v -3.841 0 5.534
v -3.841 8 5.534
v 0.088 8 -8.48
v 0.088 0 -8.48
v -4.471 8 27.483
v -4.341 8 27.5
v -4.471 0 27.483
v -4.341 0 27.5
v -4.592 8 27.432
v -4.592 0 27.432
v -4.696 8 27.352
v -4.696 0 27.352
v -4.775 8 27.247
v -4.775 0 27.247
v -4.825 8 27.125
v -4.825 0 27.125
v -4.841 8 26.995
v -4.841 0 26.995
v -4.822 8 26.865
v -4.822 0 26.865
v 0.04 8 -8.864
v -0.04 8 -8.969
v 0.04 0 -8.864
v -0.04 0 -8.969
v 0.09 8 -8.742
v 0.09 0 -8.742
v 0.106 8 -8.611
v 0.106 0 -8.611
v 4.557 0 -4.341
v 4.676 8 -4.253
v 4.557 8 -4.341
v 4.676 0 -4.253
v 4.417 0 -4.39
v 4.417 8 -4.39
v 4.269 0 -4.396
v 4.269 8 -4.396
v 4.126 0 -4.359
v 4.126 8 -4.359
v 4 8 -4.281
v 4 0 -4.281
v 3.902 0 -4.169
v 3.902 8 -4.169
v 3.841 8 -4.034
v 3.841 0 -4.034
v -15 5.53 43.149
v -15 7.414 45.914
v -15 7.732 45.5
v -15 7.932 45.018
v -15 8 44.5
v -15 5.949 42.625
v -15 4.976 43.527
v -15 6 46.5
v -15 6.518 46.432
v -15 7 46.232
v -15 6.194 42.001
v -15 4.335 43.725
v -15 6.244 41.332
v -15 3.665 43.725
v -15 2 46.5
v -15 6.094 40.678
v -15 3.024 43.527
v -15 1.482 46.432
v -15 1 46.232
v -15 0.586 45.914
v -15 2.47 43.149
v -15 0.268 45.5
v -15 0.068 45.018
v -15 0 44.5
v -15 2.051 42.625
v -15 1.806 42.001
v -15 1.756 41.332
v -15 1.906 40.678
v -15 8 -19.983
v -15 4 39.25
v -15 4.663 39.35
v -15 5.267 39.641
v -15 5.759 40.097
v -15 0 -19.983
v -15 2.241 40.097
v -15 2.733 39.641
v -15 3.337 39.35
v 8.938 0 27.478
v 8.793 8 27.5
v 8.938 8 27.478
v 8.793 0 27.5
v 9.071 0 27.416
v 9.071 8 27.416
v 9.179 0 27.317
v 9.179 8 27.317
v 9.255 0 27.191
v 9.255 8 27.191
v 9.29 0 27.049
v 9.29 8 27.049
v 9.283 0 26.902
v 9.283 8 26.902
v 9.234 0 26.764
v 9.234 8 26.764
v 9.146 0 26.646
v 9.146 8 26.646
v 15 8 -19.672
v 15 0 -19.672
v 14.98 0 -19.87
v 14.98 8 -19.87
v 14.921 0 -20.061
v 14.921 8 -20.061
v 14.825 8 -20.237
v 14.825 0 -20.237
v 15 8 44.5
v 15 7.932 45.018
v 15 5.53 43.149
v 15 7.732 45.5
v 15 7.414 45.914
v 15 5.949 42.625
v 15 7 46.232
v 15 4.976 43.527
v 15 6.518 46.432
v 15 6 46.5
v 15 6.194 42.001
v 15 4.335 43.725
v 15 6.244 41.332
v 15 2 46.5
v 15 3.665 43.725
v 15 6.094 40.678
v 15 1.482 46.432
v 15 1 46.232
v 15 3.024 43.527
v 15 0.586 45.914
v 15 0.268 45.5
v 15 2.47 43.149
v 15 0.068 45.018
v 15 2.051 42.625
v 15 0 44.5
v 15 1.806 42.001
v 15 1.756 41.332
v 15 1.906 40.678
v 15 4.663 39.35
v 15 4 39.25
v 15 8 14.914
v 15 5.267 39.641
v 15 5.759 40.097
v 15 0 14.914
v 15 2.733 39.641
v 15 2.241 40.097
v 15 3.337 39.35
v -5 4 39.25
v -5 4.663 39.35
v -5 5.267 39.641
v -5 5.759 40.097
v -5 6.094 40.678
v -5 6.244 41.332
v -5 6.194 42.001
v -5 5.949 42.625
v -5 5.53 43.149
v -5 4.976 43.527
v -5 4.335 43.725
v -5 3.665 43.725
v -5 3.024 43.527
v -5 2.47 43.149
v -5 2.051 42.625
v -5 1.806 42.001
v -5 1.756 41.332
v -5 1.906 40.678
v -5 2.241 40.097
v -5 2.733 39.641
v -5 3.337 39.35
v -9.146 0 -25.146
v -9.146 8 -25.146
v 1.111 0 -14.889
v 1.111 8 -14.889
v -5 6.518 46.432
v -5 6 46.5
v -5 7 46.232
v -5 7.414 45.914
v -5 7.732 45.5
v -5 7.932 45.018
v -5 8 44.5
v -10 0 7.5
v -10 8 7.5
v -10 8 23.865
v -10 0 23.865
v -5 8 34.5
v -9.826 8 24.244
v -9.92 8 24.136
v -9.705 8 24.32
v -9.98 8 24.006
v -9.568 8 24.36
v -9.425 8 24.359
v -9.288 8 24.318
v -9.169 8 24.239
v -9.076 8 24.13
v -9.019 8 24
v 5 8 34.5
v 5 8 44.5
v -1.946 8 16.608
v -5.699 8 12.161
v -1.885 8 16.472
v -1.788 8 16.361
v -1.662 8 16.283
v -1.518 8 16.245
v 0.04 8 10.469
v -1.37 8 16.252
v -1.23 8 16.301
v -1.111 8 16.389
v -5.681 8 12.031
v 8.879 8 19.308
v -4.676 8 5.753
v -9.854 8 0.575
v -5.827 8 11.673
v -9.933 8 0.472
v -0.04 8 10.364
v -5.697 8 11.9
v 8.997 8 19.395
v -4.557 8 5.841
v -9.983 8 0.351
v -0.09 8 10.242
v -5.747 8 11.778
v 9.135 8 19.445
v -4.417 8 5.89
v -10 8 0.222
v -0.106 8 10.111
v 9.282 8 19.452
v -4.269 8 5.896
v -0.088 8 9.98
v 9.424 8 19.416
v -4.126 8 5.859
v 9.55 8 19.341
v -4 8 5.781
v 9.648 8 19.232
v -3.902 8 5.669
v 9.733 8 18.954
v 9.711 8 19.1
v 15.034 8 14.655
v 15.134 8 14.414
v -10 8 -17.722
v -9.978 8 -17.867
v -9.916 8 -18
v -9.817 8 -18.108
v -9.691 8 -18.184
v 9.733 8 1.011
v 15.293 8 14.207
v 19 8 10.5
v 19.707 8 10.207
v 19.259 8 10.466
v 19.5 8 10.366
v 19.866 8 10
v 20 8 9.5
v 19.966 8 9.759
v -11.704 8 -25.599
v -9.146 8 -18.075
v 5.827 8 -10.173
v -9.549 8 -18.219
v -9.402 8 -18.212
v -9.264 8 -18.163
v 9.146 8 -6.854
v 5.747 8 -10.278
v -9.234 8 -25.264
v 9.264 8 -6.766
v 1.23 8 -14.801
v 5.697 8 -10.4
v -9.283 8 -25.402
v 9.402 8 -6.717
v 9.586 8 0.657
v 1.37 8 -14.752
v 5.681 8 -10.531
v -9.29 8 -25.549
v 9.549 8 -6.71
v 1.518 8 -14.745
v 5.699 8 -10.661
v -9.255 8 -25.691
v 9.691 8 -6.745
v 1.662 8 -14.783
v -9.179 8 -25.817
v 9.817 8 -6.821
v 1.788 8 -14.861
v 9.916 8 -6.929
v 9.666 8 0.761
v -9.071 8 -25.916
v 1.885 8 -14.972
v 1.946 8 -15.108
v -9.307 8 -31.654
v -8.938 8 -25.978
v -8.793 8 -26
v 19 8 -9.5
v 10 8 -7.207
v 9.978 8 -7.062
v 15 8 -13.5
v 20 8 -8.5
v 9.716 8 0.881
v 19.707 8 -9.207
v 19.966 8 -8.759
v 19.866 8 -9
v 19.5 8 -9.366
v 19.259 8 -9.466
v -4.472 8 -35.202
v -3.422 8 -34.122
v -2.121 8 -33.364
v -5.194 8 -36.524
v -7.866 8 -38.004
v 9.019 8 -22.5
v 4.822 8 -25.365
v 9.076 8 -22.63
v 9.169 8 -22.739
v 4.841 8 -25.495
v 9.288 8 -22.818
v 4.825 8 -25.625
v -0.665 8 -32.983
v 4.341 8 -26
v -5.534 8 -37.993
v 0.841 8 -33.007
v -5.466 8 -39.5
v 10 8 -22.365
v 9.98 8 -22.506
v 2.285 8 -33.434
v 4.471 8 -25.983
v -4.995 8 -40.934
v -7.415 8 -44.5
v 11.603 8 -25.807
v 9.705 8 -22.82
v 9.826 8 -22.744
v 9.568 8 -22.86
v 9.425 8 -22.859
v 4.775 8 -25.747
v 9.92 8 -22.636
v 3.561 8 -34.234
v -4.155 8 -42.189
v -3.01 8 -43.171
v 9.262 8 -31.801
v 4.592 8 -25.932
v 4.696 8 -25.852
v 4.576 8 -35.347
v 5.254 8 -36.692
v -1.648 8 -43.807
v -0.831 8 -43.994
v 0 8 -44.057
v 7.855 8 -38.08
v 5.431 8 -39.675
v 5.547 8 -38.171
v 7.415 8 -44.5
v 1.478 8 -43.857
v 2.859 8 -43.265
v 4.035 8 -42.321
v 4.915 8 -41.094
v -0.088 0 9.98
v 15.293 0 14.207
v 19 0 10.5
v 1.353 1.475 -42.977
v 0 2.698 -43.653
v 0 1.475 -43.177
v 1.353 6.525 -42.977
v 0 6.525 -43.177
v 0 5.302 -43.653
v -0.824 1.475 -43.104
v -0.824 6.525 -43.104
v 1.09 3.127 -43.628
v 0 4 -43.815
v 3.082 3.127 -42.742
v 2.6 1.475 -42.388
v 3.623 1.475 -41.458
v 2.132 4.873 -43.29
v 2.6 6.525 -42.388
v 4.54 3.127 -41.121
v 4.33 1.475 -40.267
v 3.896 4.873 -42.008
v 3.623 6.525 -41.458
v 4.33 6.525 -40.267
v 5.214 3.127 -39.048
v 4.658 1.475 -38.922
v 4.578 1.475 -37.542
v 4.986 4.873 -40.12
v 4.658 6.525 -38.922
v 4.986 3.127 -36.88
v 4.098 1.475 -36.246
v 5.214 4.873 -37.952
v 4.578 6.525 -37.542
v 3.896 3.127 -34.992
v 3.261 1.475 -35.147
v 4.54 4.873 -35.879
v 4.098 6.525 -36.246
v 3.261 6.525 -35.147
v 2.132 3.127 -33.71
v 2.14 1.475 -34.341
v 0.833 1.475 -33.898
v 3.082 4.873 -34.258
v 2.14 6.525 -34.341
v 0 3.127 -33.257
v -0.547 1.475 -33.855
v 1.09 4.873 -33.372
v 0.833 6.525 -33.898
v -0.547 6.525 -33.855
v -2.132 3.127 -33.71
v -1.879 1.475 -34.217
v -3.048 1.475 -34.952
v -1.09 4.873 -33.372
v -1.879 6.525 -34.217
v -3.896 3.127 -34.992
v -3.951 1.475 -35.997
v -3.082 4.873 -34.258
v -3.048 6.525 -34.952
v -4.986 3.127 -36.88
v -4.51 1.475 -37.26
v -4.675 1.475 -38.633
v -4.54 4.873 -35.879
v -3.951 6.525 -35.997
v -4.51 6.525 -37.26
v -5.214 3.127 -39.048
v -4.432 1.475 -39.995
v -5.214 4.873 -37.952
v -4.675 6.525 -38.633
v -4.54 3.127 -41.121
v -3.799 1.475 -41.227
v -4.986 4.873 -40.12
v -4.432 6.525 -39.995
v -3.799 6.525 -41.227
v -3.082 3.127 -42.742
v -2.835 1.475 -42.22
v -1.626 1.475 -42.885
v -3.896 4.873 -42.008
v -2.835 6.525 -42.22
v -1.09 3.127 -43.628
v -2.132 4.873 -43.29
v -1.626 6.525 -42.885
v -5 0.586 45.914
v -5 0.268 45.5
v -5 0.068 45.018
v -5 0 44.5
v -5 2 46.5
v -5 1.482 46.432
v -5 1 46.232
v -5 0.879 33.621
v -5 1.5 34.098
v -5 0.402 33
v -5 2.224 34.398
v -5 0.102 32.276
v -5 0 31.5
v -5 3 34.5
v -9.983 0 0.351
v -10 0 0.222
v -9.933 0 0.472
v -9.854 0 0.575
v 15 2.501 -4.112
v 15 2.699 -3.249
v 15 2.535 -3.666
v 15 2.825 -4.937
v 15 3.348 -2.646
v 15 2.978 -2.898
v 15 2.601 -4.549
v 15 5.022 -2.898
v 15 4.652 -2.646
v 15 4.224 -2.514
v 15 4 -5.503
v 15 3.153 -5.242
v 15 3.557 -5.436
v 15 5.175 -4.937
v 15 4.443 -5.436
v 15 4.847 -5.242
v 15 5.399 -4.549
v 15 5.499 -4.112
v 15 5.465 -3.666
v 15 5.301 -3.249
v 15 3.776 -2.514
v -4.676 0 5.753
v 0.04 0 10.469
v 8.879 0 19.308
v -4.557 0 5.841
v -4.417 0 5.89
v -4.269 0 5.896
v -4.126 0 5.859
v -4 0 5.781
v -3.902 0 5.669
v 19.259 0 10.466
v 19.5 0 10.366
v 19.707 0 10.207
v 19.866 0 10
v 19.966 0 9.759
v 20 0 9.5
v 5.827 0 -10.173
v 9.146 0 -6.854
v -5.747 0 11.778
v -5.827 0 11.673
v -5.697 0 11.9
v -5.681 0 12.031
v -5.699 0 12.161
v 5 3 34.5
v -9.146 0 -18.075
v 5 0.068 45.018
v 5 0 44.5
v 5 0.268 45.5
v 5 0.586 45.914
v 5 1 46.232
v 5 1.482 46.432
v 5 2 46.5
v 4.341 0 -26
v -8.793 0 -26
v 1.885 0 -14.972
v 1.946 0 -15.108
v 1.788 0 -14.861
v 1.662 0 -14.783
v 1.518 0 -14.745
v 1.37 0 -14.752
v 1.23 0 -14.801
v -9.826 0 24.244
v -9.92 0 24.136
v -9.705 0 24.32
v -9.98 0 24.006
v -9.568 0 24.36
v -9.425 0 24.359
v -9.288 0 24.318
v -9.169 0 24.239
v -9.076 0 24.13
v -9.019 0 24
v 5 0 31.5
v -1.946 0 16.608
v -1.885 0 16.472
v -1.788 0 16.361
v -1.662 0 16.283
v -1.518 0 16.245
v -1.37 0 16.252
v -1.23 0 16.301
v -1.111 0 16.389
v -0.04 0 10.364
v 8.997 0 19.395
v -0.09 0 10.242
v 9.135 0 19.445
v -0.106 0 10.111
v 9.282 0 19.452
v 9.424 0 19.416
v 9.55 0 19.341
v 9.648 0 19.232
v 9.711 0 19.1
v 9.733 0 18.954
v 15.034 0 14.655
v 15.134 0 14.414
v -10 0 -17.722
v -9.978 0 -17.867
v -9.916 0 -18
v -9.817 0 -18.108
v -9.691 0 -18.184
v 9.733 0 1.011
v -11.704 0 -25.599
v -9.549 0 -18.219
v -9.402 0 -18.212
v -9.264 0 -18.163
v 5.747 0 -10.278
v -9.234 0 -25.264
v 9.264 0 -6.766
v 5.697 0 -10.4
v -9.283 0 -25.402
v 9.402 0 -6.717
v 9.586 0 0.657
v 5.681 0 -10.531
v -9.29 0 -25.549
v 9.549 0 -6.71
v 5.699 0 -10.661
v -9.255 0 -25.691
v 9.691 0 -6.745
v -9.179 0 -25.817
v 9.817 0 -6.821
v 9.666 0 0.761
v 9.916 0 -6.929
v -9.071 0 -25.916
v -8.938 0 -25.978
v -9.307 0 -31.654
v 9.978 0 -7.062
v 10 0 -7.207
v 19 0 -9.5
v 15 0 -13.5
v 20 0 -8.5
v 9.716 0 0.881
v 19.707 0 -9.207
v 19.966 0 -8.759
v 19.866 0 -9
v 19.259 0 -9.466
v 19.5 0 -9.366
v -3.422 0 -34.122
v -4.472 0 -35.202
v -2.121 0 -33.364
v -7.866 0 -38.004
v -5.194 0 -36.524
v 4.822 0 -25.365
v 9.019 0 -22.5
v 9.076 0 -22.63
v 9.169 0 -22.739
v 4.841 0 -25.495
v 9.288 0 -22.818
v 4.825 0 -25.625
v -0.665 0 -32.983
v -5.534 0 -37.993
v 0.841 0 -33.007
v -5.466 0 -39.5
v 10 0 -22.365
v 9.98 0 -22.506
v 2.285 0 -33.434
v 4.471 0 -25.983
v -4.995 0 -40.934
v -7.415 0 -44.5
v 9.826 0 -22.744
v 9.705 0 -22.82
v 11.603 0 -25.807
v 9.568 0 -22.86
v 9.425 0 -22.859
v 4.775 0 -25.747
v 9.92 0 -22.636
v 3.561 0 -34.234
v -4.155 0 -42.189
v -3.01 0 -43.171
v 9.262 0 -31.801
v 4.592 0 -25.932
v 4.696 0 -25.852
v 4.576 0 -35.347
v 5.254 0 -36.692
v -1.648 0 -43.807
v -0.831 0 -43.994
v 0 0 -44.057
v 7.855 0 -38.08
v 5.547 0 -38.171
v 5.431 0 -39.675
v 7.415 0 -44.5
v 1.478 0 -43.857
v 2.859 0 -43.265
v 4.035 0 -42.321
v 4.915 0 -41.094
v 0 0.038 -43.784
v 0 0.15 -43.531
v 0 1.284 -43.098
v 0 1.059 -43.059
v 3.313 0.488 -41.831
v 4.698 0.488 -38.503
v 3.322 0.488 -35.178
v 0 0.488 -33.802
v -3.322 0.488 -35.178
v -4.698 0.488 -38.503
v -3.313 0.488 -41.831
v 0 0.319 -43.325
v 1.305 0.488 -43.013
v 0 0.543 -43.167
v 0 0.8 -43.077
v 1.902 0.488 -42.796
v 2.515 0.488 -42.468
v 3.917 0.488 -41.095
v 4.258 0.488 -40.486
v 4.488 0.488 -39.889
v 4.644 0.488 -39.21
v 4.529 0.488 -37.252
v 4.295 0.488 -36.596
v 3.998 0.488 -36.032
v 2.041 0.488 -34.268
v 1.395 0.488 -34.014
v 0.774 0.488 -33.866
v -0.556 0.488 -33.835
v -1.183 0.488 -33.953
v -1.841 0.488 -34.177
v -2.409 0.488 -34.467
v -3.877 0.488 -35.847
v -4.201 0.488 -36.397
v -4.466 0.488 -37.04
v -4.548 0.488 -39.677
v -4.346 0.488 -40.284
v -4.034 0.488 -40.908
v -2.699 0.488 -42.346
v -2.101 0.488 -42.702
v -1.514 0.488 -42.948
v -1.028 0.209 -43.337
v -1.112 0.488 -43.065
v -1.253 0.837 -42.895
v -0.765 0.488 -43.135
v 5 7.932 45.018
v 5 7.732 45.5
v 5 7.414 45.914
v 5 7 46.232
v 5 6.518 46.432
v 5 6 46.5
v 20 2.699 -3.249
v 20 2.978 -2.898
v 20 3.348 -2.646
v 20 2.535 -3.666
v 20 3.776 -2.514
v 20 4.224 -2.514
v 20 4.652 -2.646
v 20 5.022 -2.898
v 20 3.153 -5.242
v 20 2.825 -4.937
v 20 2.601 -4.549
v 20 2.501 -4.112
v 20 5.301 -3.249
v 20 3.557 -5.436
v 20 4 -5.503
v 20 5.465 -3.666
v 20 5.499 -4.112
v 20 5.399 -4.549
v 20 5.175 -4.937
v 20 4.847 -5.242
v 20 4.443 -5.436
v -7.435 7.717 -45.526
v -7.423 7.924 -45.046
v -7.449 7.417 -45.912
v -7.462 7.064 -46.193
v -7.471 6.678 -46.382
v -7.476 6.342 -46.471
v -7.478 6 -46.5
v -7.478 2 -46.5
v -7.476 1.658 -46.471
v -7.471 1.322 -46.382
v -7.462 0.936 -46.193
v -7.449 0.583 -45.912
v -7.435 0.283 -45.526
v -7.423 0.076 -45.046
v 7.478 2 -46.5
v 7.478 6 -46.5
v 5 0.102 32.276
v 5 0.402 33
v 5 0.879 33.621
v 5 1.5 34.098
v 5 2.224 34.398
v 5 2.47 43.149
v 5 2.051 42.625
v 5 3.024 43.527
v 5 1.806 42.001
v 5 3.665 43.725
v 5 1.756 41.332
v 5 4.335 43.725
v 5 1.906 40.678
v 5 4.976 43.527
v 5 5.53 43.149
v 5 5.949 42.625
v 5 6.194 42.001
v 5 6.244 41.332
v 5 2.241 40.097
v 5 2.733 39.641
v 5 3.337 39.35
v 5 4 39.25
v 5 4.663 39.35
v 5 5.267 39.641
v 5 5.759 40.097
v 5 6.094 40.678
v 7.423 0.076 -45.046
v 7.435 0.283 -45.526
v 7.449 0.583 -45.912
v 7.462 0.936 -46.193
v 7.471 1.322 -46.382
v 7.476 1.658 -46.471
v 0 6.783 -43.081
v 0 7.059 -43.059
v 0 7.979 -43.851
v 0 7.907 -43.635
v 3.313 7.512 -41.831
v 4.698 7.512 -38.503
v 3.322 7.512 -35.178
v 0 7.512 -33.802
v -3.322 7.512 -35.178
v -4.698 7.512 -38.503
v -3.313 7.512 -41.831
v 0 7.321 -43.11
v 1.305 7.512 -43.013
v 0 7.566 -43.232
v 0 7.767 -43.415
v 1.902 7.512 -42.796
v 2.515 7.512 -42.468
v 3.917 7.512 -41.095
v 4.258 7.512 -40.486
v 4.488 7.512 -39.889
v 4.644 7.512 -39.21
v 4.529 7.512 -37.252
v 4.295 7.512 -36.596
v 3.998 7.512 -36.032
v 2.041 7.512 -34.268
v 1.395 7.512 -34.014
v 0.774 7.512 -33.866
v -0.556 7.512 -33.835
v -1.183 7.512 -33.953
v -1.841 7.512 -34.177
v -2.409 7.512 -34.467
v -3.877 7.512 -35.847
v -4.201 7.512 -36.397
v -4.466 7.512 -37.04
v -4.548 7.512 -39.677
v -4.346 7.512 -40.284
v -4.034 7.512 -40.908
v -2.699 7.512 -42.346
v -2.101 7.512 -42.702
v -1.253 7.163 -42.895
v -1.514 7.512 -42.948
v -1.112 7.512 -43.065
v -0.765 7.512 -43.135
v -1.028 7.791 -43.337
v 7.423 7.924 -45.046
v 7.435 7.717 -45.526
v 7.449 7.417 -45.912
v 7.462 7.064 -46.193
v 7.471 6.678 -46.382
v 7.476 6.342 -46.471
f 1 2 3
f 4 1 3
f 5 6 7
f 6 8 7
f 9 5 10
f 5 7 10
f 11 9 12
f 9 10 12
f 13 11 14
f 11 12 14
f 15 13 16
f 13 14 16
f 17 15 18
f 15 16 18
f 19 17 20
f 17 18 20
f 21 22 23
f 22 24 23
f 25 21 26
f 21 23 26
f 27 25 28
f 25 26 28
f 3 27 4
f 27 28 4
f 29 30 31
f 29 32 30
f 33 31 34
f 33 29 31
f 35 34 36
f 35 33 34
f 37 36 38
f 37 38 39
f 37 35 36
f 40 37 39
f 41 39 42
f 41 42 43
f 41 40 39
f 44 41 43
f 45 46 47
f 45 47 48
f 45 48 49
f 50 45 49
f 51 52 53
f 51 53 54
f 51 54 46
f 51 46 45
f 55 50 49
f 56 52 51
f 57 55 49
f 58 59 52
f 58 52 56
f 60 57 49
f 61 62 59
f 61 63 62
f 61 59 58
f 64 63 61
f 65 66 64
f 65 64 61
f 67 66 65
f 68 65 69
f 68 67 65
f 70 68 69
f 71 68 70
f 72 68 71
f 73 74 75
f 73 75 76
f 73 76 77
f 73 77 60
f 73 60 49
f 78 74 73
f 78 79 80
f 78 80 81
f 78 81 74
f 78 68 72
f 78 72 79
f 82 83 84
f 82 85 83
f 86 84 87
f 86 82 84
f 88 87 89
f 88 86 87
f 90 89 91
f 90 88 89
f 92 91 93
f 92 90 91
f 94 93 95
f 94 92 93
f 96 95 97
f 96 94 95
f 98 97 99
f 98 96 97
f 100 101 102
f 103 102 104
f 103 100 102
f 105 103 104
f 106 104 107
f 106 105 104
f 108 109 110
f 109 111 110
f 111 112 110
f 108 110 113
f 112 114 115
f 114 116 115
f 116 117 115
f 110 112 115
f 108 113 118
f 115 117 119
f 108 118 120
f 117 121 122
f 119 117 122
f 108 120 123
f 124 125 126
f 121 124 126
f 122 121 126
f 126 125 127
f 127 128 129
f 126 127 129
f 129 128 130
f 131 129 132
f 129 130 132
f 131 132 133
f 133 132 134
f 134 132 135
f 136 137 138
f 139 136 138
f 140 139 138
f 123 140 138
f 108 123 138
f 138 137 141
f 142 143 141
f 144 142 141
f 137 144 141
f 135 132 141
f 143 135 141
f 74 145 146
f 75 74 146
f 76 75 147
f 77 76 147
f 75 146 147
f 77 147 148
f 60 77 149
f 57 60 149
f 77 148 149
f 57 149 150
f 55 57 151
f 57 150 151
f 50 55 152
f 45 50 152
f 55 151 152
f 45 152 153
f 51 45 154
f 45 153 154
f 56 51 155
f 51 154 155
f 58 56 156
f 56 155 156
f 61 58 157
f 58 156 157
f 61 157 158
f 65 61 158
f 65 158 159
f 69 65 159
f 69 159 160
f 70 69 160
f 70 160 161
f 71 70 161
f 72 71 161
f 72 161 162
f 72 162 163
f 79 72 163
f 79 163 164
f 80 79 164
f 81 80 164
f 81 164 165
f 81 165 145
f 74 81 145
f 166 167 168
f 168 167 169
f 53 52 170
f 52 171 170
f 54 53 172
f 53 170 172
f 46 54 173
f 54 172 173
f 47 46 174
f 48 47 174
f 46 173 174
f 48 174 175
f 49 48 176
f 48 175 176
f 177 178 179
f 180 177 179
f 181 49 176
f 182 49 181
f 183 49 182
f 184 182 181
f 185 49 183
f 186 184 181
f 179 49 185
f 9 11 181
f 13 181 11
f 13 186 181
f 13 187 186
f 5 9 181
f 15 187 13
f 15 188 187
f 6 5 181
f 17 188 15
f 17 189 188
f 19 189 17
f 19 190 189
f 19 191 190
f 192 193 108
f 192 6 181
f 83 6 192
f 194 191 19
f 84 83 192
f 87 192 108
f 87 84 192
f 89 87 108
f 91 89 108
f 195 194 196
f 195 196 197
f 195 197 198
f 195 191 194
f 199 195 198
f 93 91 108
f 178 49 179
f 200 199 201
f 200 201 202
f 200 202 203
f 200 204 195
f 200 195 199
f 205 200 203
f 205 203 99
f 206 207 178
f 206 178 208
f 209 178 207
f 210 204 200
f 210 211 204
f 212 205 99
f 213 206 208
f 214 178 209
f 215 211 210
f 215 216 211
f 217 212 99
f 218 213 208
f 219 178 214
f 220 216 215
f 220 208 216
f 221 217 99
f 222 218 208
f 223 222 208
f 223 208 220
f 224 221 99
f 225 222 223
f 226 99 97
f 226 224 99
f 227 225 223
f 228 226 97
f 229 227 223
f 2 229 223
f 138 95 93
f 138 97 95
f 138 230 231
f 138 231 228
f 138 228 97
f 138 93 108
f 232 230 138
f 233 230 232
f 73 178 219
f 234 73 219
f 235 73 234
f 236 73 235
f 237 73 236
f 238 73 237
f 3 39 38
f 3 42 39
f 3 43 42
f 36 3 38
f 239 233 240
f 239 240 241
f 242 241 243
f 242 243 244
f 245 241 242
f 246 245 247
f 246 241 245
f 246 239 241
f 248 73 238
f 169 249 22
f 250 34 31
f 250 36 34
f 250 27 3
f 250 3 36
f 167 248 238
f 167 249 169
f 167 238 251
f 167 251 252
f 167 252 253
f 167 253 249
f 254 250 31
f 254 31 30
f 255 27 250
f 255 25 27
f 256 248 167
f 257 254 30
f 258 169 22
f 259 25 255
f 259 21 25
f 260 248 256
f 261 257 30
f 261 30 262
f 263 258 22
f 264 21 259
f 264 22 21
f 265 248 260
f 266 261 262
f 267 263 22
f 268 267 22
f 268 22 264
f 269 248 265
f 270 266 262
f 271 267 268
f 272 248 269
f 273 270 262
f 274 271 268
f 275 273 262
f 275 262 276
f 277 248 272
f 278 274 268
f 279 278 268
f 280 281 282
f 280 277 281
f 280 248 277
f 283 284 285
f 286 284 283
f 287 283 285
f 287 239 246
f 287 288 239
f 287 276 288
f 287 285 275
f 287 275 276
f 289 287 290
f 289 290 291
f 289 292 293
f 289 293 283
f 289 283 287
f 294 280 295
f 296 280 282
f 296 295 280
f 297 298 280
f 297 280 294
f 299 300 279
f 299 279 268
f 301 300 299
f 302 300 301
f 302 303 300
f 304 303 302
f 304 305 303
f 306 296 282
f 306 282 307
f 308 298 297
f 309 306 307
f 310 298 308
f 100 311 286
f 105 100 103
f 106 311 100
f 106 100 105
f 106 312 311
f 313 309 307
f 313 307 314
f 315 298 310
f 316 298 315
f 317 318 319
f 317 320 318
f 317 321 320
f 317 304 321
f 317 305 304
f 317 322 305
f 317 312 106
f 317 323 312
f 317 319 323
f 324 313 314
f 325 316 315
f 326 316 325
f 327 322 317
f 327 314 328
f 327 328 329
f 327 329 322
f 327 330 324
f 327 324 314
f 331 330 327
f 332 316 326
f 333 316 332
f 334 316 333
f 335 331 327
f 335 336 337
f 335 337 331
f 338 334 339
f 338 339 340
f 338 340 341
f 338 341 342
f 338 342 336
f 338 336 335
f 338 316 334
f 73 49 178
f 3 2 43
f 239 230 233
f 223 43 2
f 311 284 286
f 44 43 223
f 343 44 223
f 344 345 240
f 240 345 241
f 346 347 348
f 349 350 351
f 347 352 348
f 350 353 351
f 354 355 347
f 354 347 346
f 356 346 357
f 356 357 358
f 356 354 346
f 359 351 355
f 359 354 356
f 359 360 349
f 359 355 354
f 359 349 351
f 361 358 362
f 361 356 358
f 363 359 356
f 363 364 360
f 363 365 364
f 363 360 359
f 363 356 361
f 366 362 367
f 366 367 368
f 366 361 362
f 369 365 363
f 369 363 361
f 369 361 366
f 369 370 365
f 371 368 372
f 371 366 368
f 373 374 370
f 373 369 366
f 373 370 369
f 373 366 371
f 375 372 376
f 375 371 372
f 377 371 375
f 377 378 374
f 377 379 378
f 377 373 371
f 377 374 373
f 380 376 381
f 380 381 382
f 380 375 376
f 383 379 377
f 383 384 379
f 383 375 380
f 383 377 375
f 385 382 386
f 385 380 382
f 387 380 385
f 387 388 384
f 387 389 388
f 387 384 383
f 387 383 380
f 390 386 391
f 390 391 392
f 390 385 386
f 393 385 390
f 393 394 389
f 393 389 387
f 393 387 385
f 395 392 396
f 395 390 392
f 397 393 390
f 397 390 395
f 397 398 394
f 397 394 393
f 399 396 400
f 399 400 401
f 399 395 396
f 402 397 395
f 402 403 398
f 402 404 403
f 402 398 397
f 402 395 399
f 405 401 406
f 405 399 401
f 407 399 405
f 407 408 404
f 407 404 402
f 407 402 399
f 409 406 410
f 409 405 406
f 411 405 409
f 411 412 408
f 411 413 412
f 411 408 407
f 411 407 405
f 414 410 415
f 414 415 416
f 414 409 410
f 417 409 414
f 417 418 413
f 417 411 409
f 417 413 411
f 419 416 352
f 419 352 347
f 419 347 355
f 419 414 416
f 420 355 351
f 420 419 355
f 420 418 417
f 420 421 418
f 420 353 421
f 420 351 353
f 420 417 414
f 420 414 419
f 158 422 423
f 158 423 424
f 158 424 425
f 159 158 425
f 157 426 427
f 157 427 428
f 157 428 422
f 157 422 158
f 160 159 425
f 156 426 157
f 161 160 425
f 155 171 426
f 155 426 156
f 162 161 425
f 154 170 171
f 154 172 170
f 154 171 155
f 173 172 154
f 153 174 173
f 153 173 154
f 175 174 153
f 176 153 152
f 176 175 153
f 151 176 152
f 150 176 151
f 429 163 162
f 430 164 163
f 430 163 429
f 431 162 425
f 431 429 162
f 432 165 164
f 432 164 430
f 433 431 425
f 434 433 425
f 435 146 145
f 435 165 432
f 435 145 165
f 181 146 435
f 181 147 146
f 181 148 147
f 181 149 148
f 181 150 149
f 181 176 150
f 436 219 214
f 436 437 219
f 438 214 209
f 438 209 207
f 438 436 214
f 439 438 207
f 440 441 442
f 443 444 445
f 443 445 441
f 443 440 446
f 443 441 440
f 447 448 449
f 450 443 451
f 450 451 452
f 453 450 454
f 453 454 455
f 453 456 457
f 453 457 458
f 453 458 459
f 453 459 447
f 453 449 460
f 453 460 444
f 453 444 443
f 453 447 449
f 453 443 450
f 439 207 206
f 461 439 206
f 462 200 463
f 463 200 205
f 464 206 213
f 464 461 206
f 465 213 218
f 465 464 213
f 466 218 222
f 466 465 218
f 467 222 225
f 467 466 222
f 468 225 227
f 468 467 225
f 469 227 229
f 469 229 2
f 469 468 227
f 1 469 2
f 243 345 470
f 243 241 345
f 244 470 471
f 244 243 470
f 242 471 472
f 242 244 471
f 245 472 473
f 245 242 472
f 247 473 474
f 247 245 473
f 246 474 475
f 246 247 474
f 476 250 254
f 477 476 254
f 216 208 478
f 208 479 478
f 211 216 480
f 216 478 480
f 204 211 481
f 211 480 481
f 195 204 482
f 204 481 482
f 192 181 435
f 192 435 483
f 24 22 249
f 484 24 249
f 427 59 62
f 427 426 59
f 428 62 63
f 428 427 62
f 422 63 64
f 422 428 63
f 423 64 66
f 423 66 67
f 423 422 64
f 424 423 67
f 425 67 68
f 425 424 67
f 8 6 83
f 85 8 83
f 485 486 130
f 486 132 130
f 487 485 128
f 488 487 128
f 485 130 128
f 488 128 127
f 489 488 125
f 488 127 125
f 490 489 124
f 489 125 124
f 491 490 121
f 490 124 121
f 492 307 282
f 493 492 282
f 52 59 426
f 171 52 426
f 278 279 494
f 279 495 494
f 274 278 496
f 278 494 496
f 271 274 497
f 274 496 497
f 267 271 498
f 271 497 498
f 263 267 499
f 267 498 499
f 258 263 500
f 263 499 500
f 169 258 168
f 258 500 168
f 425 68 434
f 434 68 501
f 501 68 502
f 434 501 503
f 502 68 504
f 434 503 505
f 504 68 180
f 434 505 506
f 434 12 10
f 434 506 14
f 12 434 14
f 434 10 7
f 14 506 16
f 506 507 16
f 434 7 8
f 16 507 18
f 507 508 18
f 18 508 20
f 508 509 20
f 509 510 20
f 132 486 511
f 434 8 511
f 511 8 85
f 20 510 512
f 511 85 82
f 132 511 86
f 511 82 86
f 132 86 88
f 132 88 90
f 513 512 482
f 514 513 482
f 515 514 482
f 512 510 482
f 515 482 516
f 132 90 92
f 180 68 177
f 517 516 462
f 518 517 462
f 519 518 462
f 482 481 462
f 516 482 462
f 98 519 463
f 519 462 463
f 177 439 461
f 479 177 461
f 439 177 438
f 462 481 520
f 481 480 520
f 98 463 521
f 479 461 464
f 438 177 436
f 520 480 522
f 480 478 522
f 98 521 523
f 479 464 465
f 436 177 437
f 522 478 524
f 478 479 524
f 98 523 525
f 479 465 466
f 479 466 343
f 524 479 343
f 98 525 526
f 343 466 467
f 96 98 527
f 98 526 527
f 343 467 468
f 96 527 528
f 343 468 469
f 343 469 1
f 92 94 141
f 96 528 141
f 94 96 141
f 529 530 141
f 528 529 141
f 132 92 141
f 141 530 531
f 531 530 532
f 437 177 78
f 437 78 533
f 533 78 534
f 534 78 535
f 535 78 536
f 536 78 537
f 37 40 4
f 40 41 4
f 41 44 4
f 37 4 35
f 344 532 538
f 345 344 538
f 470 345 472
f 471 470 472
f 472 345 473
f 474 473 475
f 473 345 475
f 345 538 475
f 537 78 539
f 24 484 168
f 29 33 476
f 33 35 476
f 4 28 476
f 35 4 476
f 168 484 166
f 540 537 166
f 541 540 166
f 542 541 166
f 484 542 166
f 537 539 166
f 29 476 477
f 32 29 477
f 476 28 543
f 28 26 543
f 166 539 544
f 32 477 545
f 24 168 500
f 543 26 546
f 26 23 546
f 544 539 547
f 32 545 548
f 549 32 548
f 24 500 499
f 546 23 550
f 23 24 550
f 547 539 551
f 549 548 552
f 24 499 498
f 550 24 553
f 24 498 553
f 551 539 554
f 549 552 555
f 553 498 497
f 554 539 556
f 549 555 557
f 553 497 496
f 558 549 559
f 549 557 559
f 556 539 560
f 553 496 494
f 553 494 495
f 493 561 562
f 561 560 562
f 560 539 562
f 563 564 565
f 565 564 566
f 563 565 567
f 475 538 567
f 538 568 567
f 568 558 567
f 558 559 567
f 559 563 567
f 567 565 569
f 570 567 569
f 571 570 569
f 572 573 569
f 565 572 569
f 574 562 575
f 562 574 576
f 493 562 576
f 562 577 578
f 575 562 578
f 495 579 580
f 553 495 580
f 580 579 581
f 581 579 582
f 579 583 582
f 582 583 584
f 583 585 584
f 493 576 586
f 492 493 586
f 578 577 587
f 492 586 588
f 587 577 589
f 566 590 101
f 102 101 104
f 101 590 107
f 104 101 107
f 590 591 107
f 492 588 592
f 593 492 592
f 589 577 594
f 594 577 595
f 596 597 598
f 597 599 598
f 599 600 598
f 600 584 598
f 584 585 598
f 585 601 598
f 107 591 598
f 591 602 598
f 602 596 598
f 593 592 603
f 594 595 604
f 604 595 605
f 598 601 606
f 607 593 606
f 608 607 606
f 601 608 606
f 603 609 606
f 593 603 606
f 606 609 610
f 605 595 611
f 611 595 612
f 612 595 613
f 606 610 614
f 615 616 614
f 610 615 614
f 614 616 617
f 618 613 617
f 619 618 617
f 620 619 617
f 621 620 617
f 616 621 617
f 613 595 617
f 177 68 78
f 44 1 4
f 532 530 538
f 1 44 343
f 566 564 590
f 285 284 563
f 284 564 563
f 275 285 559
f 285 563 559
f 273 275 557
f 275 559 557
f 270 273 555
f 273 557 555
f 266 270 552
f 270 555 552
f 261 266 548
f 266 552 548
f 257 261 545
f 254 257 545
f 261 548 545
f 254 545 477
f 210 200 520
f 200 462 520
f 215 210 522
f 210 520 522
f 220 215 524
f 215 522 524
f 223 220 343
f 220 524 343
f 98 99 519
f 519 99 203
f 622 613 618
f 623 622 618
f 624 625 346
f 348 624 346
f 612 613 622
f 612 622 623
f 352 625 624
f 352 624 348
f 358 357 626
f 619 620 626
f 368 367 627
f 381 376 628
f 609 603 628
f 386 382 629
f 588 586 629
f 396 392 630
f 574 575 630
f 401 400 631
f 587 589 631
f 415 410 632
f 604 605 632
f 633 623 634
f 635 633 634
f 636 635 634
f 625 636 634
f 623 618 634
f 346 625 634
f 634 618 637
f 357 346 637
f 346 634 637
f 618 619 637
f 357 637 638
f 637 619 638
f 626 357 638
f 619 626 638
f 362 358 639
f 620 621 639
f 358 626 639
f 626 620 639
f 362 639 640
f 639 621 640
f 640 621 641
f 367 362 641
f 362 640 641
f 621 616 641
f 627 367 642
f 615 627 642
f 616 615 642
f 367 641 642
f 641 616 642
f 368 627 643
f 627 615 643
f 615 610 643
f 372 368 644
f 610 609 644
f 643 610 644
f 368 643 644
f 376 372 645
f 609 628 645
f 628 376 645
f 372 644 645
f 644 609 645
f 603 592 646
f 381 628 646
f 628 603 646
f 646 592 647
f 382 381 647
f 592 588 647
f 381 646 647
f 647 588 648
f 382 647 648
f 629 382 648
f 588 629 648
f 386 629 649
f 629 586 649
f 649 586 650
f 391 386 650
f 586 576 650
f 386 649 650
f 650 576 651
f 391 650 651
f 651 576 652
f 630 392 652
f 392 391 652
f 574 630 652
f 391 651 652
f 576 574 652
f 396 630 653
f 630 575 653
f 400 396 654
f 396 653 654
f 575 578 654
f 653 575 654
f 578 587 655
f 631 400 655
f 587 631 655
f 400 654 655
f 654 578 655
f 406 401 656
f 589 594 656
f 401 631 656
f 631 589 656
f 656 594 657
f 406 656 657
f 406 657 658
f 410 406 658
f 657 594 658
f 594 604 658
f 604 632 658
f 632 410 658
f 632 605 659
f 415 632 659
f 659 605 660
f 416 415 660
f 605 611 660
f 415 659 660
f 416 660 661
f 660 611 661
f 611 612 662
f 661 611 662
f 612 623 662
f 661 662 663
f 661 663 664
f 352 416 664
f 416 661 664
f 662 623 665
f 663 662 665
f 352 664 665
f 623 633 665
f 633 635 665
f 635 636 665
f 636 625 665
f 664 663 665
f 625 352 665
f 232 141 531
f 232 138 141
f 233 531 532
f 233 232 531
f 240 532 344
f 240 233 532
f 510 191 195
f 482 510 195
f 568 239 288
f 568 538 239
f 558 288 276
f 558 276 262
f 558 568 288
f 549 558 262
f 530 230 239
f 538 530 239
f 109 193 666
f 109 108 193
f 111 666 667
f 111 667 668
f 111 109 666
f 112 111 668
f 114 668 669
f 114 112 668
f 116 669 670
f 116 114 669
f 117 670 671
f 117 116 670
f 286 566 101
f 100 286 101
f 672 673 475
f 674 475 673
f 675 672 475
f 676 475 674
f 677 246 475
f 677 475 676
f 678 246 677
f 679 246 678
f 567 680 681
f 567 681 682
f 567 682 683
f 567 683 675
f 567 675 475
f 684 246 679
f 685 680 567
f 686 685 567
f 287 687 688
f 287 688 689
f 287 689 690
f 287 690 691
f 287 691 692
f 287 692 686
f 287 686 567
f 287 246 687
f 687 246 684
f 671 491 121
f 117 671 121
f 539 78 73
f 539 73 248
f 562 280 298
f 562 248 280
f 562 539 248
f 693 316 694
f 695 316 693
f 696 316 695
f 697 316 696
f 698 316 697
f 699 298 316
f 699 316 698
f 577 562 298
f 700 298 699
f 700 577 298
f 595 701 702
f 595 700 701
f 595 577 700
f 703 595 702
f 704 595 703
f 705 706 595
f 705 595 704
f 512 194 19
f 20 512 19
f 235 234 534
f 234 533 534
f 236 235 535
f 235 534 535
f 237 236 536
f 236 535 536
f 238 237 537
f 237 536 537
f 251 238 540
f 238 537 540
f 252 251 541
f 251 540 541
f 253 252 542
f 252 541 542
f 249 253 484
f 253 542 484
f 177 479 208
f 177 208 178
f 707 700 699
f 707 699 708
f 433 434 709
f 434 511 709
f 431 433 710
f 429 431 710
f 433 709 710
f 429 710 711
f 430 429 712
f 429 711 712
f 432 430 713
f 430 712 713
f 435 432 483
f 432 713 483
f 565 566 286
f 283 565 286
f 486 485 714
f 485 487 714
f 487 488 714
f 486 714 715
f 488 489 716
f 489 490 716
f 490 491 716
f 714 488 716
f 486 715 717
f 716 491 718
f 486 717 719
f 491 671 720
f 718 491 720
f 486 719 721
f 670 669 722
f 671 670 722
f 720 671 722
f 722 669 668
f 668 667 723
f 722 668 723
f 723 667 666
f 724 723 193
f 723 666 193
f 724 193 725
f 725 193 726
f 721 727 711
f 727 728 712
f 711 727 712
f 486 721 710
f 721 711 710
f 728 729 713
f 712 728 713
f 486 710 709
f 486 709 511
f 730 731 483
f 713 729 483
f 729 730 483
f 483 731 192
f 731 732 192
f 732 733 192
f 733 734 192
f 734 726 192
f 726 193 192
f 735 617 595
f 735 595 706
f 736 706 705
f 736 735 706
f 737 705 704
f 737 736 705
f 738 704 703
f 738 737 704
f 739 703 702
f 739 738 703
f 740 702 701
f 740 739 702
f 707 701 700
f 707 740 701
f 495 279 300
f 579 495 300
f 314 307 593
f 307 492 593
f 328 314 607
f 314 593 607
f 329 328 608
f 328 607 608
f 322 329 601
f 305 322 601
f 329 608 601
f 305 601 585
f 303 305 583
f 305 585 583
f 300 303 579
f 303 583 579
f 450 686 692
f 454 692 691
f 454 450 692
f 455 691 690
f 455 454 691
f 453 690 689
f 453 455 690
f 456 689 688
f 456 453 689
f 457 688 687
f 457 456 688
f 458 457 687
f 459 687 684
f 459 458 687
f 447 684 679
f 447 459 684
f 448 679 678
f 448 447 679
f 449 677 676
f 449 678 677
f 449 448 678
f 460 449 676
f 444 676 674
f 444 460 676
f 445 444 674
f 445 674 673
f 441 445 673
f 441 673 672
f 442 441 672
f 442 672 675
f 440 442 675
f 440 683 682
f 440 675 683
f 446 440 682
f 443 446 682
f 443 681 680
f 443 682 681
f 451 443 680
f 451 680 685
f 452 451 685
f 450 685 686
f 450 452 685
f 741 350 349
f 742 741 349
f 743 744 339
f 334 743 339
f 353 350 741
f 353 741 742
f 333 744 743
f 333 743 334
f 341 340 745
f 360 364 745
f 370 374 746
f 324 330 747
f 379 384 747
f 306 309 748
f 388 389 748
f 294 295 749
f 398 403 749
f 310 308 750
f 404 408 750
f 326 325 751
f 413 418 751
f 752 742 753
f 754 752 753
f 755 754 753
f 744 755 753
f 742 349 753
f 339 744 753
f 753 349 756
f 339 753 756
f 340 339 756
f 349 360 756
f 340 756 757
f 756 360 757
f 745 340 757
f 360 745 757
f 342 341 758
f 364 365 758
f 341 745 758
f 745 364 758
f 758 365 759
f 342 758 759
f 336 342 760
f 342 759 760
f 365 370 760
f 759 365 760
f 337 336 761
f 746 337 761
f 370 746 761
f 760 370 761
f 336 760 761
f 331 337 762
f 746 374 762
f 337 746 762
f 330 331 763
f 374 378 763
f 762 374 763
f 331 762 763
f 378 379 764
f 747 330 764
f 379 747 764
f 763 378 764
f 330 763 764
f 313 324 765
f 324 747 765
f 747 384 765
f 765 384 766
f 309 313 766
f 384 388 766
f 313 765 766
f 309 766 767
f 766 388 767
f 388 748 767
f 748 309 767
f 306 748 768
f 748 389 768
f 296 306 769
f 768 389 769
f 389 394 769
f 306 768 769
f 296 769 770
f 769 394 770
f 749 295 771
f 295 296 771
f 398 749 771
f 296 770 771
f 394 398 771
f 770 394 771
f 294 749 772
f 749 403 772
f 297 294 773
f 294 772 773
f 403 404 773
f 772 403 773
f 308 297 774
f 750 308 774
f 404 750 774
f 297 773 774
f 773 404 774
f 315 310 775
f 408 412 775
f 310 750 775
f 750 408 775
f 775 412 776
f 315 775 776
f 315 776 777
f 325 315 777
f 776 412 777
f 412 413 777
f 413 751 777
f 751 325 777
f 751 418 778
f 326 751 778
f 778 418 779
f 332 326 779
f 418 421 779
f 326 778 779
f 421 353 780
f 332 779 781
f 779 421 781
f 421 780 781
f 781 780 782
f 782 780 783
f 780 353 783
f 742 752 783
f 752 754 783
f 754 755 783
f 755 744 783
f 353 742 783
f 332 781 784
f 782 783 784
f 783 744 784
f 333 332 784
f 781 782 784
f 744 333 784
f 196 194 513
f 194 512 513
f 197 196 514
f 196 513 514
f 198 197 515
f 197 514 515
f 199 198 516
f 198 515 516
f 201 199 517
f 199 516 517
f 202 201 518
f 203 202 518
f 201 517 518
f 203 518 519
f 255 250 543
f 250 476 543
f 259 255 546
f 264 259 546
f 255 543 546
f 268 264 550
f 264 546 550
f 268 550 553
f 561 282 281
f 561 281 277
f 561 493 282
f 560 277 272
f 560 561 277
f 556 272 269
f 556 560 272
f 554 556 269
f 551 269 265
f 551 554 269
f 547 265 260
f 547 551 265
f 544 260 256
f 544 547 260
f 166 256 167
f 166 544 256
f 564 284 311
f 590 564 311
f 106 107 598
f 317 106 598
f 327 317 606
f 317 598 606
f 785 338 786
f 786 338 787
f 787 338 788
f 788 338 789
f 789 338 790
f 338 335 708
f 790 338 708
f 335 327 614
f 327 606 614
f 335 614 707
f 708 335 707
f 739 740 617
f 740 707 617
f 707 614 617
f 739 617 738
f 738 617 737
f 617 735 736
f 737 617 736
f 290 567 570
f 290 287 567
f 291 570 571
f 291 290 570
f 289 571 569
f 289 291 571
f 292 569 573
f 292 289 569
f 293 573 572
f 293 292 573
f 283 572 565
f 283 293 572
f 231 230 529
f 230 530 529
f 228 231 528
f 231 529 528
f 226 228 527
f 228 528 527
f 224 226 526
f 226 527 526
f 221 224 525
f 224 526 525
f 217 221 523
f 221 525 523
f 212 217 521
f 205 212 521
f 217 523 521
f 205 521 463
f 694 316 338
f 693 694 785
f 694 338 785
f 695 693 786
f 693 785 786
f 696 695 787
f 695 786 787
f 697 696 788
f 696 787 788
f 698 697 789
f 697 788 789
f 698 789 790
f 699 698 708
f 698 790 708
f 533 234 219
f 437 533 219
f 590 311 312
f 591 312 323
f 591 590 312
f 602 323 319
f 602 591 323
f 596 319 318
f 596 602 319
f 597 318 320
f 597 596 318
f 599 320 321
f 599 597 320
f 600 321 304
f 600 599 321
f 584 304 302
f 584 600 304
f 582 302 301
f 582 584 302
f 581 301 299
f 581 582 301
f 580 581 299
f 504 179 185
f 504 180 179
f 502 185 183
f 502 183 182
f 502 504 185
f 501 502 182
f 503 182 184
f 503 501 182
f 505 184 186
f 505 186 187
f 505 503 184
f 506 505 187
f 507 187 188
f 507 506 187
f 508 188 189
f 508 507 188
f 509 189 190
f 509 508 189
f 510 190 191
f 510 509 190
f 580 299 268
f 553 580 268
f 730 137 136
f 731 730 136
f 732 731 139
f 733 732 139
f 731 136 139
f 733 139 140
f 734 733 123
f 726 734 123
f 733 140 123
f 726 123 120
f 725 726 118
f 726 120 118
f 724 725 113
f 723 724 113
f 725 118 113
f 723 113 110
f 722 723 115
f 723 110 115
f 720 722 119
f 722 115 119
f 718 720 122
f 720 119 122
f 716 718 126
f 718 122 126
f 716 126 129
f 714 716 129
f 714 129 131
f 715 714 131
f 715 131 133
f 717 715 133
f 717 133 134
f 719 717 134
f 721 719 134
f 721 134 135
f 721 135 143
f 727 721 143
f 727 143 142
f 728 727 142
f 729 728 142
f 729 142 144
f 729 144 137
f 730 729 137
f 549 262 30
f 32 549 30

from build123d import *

# Parameters (mm, degrees)
SKETCH1_W               = 30
SKETCH1_H               = 93
BOSS_EXTRUDE1_DEPTH     = 8
SKETCH2_W               = 10
SKETCH2_H               = 12
CUT_EXTRUDE1_DEPTH      = 8
SKETCH3_R               = 2.25
CUT_EXTRUDE2_DEPTH      = 56.91287866
FILLET1_R               = 2
CUT_EXTRUDE3_DEPTH      = 50.51009998
FILLET2_R               = 3
CUT_EXTRUDE4_DEPTH      = 50.51009998
CUT_EXTRUDE4_DEPTH_BACK = 50.51009998
FILLET3_R               = 1
FILLET4_R               = 0.5
SKETCH8_W               = 20
SKETCH8_H               = 8
BOSS_EXTRUDE2_DEPTH     = 5
CUT_EXTRUDE5_DEPTH      = 59.747340518
CUT_EXTRUDE5_DEPTH_BACK = 5
SKETCH9_R               = 1.502727392
CHAMFER1_SIZE           = 4
FILLET5_R               = 1


with BuildPart() as part:
    # Sketch1 → Boss-Extrude1 (new body)
    with BuildSketch(Plane(origin=(0, 0, 0), x_dir=(1, 0, 0), z_dir=(0, 1, 0))):
        Rectangle(SKETCH1_W, SKETCH1_H)
    extrude(amount=BOSS_EXTRUDE1_DEPTH)

    # Sketch2 → Cut-Extrude1 (cut)
    with BuildSketch(Plane(origin=(0, 8, 0), x_dir=(1, 0, 0), z_dir=(0, 1, 0))):
        with Locations((0, -40.5)):
            Rectangle(SKETCH2_W, SKETCH2_H)
    extrude(amount=-CUT_EXTRUDE1_DEPTH, mode=Mode.SUBTRACT)

    # Sketch3 → Cut-Extrude2 (cut, through all)
    with BuildSketch(Plane(origin=(15, 0, 0), x_dir=(0, 0, -1), z_dir=(1, 0, 0))):
        with Locations((-41.5, 4)):
            Circle(SKETCH3_R)
    extrude(amount=-CUT_EXTRUDE2_DEPTH, mode=Mode.SUBTRACT)

    # Fillet1
    fillet1_edges = [part.edges().sort_by_distance(p)[0] for p in [
        (10, 0, 46.5),
        (-10, 8, 46.5),
        (10, 8, 46.5),
        (-10, 0, 46.5),
        (0, 0, -46.5),
        (0, 8, -46.5),
    ]]
    fillet(fillet1_edges, radius=FILLET1_R)

    # Sketch4 → Cut-Extrude3 (cut, through all)
    with BuildSketch(Plane(origin=(0, 8, 0), x_dir=(1, 0, 0), z_dir=(0, 1, 0))):
        Polygon((5, 26), (-10, 26), (1.715328467, 14.284671533), align=None)
        Polygon((10, 6), (10, 26), (5.620437956, 10.379562044), align=None)
        Polygon((-10, -7.5), (-10, -27.5), (-5.620437956, -11.879562044), align=None)
        Polygon((-5, -27.5), (10, -27.5), (-1.715328467, -15.784671533), align=None)
        Polygon((-10, 18.928932188), (-10, -0.428932188), (-4.072028946, -6.356903242), (0.166919457, 8.762012731), align=None)
        Polygon((9.732575479, -20.161507667), (9.732575479, -0.803643291), (4.072028946, 4.856903242), (-0.166919457, -10.262012731), align=None)
    extrude(amount=-CUT_EXTRUDE3_DEPTH, mode=Mode.SUBTRACT)

    # Fillet2
    fillet2_edges = [part.edges().sort_by_distance(p)[0] for p in [
        (0, 0, 34.5),
    ]]
    fillet(fillet2_edges, radius=FILLET2_R)

    # Sketch6 → Cut-Extrude4 (cut, two sides: drawn at the far end of the back side and taken through both)
    with BuildSketch(Plane(origin=(0, 8, 0), x_dir=(1, 0, 0), z_dir=(0, 1, 0)).offset(-CUT_EXTRUDE4_DEPTH_BACK)):
        with BuildLine():
            Line((-7.477541934, 46.5), (-15, 46.5))
            Line((-15, 46.5), (-15, 19.983197599))
            ThreePointArc((-15, 19.983197599), (-9.022671438, 32.612921347), (-7.477541934, 46.5))
        make_face()
        with BuildLine():
            Line((15, 46.5), (15, 19.983197599))
            ThreePointArc((15, 19.983197599), (9.022671438, 32.612921347), (7.477541934, 46.5))
            Line((7.477541934, 46.5), (15, 46.5))
        make_face()
    extrude(amount=CUT_EXTRUDE4_DEPTH + CUT_EXTRUDE4_DEPTH_BACK, mode=Mode.SUBTRACT)

    # Sketch5 → Cut-Revolve1 (revolve, cut)
    with BuildSketch(Plane(origin=(0, 0, 0), x_dir=(0, 0, -1), z_dir=(1, 0, 0))):
        with BuildLine():
            Line((38.5, 8), (38.5, 0))
            Line((38.5, 0), (42, 0))
            ThreePointArc((42, 0), (43.815072906, 4), (42, 8))
            Line((42, 8), (38.5, 8))
        make_face()
    revolve(axis=Axis((0, 8, -38.5), (0, -1, 0)), mode=Mode.SUBTRACT)

    # Fillet3
    fillet3_edges = [part.edges().sort_by_distance(p)[0] for p in [
        (0, 8, -35),
        (0, 0, -35),
    ]]
    fillet(fillet3_edges, radius=FILLET3_R)

    # Fillet4
    fillet4_edges = [part.edges().sort_by_distance(p)[0] for p in [
        (-10, 4, -18.928932188),
        (0.166919457, 4, -8.762012731),
        (-4.072028946, 4, 6.356903242),
        (-10, 4, 0.428932188),
        (-1.715328467, 4, 15.784671533),
        (10, 4, 27.5),
        (-5, 4, 27.5),
        (10, 4, -6),
        (5.620437956, 4, -10.379562044),
        (10, 4, -26),
        (-5.620437956, 4, 11.879562044),
        (-10, 4, 27.5),
        (9.732575479, 4, 20.161507667),
        (-0.166919457, 4, 10.262012731),
        (4.072028946, 4, -4.856903242),
        (9.732575479, 4, 0.803643291),
        (5, 4, -26),
        (1.715328467, 4, -14.284671533),
        (-10, 4, -26),
    ]]
    fillet(fillet4_edges, radius=FILLET4_R)

    # Sketch8 → Boss-Extrude2 (add)
    with BuildSketch(Plane(origin=(15, 0, 0), x_dir=(0, 0, -1), z_dir=(1, 0, 0))):
        with Locations((-0.5, 4)):
            Rectangle(SKETCH8_W, SKETCH8_H)
    extrude(amount=BOSS_EXTRUDE2_DEPTH)

    # Sketch9 → Cut-Extrude5 (cut, two sides: drawn at the far end of the back side and taken through both)
    with BuildSketch(Plane(origin=(20, 0, 0), x_dir=(0, 0, -1), z_dir=(1, 0, 0)).offset(-CUT_EXTRUDE5_DEPTH_BACK)):
        with Locations((4, 4)):
            Circle(SKETCH9_R)
    extrude(amount=CUT_EXTRUDE5_DEPTH + CUT_EXTRUDE5_DEPTH_BACK, mode=Mode.SUBTRACT)

    # Chamfer1
    chamfer1_edges = [part.edges().sort_by_distance(p)[0] for p in [
        (15, 4, 10.5),
        (15, 4, -9.5),
    ]]
    chamfer(chamfer1_edges, length=CHAMFER1_SIZE)

    # Fillet5
    fillet5_edges = [part.edges().sort_by_distance(p)[0] for p in [
        (20, 4, 10.5),
        (15, 4, 14.5),
        (15, 4, -19.983197599),
        (20, 4, -9.5),
    ]]
    fillet(fillet5_edges, radius=FILLET5_R - 0.0001)  # a hair under: the kernel refuses the full size


solid = part.part
